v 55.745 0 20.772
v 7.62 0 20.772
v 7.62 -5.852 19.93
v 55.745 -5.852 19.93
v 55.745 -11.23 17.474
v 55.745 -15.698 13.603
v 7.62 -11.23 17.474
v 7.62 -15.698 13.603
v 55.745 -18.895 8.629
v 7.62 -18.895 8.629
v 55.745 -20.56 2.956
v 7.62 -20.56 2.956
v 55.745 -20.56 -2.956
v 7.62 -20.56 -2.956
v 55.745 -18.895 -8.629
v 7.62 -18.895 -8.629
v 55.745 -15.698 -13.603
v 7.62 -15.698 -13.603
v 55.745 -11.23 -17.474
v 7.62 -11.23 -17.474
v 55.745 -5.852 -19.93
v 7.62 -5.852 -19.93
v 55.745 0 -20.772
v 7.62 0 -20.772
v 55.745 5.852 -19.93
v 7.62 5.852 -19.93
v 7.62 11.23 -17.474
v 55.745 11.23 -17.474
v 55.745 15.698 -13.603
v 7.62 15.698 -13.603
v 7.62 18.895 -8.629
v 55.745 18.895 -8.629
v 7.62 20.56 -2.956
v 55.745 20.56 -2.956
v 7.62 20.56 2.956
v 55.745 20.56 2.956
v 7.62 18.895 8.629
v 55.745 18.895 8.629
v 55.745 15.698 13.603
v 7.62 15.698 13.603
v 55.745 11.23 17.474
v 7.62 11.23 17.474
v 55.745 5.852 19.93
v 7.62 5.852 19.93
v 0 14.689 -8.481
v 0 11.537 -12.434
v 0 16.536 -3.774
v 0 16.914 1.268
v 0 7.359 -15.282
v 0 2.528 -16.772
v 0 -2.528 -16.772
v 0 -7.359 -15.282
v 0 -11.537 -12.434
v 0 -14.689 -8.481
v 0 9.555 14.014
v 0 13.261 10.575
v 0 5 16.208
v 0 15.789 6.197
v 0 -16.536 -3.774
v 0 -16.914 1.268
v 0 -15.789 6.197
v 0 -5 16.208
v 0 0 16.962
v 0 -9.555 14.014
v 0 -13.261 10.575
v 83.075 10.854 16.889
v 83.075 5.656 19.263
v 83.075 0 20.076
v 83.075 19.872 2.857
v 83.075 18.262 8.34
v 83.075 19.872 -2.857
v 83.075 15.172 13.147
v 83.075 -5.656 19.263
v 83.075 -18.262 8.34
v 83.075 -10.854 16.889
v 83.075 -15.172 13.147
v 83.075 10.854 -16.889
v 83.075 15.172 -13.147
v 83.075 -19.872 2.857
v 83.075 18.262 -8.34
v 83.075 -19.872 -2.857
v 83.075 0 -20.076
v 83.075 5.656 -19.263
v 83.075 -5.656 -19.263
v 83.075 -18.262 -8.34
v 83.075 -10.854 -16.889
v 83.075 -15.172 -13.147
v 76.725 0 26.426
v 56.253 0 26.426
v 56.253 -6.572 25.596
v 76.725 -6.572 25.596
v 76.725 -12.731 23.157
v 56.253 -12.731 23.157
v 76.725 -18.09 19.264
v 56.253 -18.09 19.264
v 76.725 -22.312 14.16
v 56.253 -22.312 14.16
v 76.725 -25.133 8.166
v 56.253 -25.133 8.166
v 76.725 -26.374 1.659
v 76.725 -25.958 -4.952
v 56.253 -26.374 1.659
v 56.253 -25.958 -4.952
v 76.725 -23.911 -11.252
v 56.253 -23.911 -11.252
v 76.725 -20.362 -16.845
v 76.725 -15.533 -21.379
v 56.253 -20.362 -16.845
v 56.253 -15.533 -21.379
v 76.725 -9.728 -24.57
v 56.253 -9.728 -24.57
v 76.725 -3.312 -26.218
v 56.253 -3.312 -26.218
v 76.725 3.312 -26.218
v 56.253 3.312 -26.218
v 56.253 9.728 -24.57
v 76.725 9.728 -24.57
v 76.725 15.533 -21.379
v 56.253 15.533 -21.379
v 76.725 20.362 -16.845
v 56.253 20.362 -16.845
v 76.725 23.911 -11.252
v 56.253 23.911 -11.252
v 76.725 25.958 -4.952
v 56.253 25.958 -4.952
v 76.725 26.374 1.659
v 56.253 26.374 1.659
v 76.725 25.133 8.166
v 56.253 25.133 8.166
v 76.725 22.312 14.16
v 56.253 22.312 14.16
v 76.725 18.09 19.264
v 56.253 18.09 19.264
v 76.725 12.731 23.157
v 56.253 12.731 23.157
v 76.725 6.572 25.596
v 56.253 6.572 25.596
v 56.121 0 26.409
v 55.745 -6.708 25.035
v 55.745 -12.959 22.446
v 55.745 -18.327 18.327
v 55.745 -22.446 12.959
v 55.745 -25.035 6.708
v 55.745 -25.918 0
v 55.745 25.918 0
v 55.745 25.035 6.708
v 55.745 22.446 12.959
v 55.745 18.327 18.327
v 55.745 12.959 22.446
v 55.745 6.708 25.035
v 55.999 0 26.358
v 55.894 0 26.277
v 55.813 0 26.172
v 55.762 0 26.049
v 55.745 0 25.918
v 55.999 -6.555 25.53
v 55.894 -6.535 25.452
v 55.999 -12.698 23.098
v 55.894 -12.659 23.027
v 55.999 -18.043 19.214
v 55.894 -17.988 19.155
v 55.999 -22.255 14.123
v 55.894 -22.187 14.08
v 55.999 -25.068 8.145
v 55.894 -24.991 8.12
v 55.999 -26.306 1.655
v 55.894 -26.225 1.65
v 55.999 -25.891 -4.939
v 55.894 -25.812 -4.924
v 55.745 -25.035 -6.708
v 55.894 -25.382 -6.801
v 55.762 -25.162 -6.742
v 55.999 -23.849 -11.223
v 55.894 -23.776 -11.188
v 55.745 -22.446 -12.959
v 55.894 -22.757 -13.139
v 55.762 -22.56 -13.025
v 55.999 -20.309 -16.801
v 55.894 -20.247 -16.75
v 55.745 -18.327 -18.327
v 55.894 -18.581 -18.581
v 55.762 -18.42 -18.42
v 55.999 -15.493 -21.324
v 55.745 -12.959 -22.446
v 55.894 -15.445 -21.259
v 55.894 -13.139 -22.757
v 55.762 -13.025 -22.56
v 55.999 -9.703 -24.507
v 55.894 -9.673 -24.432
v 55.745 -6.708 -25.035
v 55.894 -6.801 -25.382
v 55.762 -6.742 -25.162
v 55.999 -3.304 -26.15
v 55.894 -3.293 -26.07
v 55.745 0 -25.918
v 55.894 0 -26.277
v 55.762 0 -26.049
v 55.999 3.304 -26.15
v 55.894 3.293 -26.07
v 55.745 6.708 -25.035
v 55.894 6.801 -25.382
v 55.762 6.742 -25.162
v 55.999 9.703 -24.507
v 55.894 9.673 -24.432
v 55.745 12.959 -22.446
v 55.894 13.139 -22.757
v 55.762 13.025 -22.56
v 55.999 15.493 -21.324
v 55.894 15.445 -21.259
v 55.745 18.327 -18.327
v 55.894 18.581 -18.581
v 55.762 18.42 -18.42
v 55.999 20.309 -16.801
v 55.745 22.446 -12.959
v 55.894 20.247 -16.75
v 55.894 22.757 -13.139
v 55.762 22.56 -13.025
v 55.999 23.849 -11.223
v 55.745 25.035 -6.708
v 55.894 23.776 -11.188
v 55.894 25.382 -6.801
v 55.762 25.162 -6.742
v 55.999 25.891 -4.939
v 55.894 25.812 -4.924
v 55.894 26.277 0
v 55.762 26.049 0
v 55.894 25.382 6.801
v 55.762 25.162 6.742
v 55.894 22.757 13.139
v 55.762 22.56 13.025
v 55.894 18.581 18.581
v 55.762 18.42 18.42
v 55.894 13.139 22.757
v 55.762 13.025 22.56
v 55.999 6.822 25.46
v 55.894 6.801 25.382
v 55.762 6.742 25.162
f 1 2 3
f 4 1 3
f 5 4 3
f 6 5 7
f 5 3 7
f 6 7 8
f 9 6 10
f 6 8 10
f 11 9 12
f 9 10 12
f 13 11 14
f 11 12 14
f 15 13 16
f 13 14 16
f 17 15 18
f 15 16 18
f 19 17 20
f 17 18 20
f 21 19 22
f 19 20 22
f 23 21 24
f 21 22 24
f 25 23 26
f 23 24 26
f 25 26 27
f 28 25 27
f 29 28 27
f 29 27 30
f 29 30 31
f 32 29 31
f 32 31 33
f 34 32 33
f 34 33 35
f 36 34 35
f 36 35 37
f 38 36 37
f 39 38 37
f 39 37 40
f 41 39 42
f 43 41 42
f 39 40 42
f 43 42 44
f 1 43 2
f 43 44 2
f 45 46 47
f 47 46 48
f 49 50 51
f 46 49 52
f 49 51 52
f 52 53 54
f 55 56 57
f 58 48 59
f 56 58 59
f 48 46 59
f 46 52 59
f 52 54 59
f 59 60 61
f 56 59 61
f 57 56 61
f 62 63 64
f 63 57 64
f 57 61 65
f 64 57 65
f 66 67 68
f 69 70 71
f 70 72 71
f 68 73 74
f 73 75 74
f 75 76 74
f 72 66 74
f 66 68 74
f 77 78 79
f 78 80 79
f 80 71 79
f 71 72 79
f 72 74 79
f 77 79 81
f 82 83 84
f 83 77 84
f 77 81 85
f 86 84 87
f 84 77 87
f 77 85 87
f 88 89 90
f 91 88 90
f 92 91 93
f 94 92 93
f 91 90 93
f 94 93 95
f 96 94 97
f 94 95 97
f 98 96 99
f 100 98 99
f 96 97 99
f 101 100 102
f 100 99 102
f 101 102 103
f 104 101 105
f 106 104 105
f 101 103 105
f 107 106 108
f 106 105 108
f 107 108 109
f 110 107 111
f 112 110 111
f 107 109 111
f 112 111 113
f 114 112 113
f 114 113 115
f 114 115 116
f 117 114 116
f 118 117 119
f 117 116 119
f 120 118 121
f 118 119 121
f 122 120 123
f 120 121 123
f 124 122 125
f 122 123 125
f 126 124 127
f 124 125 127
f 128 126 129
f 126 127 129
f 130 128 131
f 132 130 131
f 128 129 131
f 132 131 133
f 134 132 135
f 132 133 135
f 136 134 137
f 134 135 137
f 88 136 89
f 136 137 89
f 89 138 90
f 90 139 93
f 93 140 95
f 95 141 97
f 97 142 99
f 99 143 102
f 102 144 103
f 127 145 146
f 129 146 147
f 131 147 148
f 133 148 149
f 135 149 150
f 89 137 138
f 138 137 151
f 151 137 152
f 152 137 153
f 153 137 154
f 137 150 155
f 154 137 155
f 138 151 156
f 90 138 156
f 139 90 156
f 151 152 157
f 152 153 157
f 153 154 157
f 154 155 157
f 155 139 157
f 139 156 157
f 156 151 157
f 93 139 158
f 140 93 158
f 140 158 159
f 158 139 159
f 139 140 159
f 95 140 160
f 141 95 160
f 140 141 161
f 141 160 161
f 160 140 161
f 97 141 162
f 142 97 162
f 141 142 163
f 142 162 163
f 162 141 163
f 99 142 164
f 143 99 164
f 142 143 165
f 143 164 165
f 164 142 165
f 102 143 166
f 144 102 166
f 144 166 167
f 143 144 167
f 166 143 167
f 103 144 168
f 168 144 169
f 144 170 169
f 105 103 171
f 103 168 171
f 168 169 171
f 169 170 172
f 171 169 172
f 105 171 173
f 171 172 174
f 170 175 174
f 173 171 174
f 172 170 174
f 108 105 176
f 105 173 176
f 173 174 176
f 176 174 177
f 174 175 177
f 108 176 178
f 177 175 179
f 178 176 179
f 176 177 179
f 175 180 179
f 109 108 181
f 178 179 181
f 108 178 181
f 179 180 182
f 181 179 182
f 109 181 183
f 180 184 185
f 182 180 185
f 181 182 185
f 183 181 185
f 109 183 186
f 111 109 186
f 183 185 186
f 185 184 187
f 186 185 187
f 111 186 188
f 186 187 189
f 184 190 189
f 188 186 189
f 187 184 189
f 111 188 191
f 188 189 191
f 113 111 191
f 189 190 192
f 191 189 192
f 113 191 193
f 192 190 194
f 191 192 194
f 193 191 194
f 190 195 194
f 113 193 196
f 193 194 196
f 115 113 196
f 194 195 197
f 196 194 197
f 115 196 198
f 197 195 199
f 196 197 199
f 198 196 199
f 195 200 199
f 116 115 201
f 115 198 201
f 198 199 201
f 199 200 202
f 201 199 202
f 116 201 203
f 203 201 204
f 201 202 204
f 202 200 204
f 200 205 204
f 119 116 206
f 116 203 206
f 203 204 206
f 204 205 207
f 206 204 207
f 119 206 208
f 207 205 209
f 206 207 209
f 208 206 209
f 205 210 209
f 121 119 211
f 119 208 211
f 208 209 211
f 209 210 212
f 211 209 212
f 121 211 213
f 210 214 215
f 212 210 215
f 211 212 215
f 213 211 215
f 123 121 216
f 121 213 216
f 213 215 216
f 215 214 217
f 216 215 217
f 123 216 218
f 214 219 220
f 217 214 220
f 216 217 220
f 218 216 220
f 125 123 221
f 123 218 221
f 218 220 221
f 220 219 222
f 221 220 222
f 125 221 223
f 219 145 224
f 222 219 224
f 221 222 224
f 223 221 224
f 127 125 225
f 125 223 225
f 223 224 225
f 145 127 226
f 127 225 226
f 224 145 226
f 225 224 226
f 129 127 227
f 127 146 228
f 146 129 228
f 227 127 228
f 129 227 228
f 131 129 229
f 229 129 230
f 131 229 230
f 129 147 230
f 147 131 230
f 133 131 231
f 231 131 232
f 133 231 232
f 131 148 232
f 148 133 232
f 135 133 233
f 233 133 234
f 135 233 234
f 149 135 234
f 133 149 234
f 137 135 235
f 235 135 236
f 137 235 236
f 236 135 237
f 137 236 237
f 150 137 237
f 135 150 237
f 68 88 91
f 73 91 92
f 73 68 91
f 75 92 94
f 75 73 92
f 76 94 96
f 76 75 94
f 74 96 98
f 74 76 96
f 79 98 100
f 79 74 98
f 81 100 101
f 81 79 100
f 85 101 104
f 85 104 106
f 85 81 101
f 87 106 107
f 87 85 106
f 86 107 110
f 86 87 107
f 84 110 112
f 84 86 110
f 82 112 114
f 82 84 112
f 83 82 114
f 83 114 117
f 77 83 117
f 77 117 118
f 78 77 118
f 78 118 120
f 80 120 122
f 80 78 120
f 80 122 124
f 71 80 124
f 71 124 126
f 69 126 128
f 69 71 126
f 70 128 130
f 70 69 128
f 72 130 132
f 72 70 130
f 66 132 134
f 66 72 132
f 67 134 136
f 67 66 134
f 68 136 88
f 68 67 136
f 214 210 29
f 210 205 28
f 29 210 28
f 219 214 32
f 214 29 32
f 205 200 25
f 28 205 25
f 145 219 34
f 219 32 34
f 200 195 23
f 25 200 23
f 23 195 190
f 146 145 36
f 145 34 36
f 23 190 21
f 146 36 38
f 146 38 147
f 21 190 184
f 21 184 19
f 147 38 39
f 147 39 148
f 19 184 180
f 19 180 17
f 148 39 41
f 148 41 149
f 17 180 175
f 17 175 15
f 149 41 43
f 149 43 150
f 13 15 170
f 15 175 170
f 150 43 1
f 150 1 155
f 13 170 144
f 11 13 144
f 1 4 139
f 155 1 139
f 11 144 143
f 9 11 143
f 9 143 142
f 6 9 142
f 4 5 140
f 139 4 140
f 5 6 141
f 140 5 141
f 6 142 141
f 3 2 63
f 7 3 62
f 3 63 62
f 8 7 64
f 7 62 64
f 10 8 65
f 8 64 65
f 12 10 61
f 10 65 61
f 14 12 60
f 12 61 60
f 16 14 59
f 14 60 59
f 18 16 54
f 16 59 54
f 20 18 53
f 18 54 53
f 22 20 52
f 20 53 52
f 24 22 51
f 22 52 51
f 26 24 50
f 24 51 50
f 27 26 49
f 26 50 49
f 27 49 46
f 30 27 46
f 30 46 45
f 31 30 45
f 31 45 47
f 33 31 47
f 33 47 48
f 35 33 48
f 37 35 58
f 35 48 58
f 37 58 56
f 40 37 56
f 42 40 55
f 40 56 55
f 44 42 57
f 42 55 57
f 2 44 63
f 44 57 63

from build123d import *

# Parameters (mm, degrees)
F2_R     = 0.508
F3_SIZE  = 6.35
F4_SIZE2 = 3.81
F4_SIZE  = 7.62


with BuildPart() as f1:
    # F0 (on Front) → F1 (revolve)
    with BuildSketch(Plane.XZ):
        Polygon((55.7449534535, 20.7715928555), (0, 20.7715928555), (0, 0), (83.0746293068, 0), (83.0746293068, 26.4260116965), (55.7449534535, 26.4260116965), align=None)
    revolve(axis=Axis((60.4887977242, 0, 0), (1, 0, 0)))

    # F2
    f2_edges = [f1.edges().sort_by_distance(p)[0] for p in [
        (55.744953, 0, -26.426012),
    ]]
    fillet(f2_edges, radius=F2_R)

    # F3
    f3_edges = [f1.edges().sort_by_distance(p)[0] for p in [
        (83.074629, 0, -26.426012),
    ]]
    chamfer(f3_edges, length=F3_SIZE)

    # F4
    f4_edges = [f1.edges().sort_by_distance(p)[0] for p in [
        (0, 0, -20.771593),
    ]]
    f4_side = f1.faces().sort_by_distance((27.872477, 0, -20.771593))[0]
    chamfer(f4_edges, length=F4_SIZE, length2=F4_SIZE2, reference=f4_side)


solid = f1.part
